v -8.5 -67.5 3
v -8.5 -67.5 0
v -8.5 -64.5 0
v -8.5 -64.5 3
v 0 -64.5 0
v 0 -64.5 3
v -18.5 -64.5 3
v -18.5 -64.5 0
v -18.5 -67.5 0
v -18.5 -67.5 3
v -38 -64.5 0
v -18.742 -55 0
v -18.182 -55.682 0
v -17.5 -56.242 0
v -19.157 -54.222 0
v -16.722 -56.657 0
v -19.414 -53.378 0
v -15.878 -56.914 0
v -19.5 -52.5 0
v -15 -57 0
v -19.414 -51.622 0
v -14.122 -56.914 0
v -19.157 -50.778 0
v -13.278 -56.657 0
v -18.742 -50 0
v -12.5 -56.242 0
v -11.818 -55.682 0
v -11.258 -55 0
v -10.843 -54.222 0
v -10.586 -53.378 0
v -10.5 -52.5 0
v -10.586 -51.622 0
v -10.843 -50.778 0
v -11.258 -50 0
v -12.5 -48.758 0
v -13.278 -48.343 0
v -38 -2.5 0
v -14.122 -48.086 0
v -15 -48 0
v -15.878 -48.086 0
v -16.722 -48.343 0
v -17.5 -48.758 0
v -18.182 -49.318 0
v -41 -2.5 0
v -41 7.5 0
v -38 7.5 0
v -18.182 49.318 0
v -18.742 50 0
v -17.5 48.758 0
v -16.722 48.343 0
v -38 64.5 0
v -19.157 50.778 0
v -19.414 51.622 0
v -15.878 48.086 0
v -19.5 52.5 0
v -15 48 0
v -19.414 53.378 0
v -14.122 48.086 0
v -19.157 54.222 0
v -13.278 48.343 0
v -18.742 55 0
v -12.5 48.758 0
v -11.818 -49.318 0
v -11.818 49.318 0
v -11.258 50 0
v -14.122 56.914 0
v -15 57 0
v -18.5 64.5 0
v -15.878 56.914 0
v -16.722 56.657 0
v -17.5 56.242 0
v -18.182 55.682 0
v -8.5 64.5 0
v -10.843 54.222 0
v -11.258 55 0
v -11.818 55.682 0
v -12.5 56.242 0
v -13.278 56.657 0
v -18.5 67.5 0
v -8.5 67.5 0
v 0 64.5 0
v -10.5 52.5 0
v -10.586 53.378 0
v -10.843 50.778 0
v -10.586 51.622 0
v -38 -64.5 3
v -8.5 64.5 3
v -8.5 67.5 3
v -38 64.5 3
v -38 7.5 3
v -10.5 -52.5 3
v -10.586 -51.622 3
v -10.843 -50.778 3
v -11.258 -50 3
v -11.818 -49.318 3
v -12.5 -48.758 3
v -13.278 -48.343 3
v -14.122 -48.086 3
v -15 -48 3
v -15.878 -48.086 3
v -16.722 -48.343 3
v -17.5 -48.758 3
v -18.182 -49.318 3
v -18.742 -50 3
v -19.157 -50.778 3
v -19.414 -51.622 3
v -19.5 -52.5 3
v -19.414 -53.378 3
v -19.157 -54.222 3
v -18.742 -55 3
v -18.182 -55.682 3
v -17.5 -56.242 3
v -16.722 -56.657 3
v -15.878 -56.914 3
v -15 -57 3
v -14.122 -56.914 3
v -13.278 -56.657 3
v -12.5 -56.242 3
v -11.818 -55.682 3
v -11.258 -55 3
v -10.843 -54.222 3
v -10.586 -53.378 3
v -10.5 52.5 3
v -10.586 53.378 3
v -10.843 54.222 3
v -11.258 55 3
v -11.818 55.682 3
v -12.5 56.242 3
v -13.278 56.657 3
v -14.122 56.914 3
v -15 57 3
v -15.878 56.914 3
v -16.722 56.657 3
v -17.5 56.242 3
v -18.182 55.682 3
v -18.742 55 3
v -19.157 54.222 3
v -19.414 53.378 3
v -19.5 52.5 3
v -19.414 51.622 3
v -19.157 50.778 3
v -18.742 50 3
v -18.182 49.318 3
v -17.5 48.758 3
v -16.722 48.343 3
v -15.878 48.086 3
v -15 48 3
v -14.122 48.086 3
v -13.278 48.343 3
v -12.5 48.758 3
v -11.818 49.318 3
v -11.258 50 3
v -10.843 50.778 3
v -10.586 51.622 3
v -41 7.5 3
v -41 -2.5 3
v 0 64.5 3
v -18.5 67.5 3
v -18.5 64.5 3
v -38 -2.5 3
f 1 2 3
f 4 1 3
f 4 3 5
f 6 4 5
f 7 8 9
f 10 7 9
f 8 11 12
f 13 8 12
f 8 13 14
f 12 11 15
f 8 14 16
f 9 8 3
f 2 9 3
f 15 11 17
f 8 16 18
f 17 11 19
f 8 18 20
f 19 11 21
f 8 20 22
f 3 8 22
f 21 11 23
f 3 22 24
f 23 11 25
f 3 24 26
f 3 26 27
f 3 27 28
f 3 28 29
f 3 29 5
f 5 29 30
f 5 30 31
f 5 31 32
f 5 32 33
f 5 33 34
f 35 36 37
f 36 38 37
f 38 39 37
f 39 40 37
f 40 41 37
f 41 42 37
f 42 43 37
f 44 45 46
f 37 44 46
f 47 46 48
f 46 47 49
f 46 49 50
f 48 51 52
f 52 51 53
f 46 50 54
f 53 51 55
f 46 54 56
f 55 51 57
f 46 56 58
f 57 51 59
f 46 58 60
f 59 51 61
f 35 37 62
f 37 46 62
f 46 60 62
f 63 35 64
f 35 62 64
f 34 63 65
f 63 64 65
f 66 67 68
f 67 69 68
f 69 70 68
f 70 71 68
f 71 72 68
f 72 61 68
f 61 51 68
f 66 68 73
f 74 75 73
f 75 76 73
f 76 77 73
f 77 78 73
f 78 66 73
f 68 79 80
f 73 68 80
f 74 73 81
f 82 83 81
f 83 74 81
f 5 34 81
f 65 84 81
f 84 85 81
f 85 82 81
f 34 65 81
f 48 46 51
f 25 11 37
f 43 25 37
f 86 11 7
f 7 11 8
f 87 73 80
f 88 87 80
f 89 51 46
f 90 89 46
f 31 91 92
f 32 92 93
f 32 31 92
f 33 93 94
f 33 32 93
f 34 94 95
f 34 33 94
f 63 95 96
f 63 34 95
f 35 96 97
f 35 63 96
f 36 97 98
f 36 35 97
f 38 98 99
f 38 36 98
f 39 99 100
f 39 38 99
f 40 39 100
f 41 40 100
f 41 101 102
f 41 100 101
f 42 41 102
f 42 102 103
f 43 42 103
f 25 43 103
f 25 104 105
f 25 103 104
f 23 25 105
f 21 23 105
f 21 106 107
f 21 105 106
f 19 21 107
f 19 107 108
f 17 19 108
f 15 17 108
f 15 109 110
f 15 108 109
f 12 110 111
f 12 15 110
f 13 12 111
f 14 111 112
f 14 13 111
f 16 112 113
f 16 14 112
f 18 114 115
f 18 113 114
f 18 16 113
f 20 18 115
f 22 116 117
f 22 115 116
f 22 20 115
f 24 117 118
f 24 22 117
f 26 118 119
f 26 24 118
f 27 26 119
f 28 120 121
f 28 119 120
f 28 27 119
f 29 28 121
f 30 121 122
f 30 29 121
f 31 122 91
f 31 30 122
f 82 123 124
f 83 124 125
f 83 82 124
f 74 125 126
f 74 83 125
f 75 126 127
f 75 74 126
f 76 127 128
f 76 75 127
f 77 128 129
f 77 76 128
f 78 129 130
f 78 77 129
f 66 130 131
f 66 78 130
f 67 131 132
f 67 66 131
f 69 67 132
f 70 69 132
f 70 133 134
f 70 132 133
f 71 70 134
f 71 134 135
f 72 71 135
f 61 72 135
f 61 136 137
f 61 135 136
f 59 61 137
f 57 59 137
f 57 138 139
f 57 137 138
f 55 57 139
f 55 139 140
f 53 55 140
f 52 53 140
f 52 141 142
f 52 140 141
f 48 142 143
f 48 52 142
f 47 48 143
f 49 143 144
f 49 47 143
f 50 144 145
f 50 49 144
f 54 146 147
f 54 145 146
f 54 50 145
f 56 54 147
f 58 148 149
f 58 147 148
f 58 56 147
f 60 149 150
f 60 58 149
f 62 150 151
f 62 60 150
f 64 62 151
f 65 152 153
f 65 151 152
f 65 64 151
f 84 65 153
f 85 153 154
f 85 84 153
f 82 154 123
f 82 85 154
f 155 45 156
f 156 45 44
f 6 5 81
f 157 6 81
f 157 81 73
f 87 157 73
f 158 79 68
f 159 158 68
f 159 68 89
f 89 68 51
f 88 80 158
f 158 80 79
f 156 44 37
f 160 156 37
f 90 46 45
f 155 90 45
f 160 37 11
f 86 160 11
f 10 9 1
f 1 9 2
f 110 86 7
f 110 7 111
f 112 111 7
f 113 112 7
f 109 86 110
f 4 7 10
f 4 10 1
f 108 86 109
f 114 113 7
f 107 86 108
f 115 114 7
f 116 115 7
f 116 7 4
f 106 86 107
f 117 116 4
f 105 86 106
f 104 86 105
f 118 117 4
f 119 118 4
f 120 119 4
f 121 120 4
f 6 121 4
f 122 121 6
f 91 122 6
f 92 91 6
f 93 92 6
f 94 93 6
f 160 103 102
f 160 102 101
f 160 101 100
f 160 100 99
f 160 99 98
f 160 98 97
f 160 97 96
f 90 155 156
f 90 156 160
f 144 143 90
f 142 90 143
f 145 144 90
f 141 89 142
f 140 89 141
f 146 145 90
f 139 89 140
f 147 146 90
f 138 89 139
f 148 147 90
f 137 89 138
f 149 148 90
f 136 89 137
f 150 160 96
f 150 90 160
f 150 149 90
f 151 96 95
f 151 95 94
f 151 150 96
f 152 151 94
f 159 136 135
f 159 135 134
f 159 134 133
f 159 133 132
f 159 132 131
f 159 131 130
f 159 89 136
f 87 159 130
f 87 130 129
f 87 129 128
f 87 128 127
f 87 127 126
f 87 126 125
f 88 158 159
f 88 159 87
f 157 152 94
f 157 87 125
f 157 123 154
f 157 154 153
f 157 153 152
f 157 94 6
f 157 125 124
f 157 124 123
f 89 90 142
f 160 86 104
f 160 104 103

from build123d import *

# Parameters (mm, degrees)
BOSS_EXTRUDE1_DEPTH = 3
SKETCH3_R           = 4.5
CUT_EXTRUDE4_DEPTH  = 80.033220863


with BuildPart() as part:
    # Sketch2 → Boss-Extrude1 (new body)
    with BuildSketch(Plane.XY):
        Polygon((0, 64.5), (-8.5, 64.5), (-8.5, 67.5), (-18.5, 67.5), (-18.5, 64.5), (-38, 64.5), (-38, 7.5), (-41, 7.5), (-41, -2.5), (-38, -2.5), (-38, -64.5), (-18.5, -64.5), (-18.5, -67.5), (-8.5, -67.5), (-8.5, -64.5), (0, -64.5), align=None)
    extrude(amount=BOSS_EXTRUDE1_DEPTH)

    # Sketch3 → Cut-Extrude4 (cut, through all)
    with BuildSketch(Plane.XY):
        with Locations((-15, 52.5)):
            Circle(SKETCH3_R)
        with Locations((-15, -52.5)):
            Circle(SKETCH3_R)
    extrude(amount=CUT_EXTRUDE4_DEPTH, mode=Mode.SUBTRACT)


solid = part.part
